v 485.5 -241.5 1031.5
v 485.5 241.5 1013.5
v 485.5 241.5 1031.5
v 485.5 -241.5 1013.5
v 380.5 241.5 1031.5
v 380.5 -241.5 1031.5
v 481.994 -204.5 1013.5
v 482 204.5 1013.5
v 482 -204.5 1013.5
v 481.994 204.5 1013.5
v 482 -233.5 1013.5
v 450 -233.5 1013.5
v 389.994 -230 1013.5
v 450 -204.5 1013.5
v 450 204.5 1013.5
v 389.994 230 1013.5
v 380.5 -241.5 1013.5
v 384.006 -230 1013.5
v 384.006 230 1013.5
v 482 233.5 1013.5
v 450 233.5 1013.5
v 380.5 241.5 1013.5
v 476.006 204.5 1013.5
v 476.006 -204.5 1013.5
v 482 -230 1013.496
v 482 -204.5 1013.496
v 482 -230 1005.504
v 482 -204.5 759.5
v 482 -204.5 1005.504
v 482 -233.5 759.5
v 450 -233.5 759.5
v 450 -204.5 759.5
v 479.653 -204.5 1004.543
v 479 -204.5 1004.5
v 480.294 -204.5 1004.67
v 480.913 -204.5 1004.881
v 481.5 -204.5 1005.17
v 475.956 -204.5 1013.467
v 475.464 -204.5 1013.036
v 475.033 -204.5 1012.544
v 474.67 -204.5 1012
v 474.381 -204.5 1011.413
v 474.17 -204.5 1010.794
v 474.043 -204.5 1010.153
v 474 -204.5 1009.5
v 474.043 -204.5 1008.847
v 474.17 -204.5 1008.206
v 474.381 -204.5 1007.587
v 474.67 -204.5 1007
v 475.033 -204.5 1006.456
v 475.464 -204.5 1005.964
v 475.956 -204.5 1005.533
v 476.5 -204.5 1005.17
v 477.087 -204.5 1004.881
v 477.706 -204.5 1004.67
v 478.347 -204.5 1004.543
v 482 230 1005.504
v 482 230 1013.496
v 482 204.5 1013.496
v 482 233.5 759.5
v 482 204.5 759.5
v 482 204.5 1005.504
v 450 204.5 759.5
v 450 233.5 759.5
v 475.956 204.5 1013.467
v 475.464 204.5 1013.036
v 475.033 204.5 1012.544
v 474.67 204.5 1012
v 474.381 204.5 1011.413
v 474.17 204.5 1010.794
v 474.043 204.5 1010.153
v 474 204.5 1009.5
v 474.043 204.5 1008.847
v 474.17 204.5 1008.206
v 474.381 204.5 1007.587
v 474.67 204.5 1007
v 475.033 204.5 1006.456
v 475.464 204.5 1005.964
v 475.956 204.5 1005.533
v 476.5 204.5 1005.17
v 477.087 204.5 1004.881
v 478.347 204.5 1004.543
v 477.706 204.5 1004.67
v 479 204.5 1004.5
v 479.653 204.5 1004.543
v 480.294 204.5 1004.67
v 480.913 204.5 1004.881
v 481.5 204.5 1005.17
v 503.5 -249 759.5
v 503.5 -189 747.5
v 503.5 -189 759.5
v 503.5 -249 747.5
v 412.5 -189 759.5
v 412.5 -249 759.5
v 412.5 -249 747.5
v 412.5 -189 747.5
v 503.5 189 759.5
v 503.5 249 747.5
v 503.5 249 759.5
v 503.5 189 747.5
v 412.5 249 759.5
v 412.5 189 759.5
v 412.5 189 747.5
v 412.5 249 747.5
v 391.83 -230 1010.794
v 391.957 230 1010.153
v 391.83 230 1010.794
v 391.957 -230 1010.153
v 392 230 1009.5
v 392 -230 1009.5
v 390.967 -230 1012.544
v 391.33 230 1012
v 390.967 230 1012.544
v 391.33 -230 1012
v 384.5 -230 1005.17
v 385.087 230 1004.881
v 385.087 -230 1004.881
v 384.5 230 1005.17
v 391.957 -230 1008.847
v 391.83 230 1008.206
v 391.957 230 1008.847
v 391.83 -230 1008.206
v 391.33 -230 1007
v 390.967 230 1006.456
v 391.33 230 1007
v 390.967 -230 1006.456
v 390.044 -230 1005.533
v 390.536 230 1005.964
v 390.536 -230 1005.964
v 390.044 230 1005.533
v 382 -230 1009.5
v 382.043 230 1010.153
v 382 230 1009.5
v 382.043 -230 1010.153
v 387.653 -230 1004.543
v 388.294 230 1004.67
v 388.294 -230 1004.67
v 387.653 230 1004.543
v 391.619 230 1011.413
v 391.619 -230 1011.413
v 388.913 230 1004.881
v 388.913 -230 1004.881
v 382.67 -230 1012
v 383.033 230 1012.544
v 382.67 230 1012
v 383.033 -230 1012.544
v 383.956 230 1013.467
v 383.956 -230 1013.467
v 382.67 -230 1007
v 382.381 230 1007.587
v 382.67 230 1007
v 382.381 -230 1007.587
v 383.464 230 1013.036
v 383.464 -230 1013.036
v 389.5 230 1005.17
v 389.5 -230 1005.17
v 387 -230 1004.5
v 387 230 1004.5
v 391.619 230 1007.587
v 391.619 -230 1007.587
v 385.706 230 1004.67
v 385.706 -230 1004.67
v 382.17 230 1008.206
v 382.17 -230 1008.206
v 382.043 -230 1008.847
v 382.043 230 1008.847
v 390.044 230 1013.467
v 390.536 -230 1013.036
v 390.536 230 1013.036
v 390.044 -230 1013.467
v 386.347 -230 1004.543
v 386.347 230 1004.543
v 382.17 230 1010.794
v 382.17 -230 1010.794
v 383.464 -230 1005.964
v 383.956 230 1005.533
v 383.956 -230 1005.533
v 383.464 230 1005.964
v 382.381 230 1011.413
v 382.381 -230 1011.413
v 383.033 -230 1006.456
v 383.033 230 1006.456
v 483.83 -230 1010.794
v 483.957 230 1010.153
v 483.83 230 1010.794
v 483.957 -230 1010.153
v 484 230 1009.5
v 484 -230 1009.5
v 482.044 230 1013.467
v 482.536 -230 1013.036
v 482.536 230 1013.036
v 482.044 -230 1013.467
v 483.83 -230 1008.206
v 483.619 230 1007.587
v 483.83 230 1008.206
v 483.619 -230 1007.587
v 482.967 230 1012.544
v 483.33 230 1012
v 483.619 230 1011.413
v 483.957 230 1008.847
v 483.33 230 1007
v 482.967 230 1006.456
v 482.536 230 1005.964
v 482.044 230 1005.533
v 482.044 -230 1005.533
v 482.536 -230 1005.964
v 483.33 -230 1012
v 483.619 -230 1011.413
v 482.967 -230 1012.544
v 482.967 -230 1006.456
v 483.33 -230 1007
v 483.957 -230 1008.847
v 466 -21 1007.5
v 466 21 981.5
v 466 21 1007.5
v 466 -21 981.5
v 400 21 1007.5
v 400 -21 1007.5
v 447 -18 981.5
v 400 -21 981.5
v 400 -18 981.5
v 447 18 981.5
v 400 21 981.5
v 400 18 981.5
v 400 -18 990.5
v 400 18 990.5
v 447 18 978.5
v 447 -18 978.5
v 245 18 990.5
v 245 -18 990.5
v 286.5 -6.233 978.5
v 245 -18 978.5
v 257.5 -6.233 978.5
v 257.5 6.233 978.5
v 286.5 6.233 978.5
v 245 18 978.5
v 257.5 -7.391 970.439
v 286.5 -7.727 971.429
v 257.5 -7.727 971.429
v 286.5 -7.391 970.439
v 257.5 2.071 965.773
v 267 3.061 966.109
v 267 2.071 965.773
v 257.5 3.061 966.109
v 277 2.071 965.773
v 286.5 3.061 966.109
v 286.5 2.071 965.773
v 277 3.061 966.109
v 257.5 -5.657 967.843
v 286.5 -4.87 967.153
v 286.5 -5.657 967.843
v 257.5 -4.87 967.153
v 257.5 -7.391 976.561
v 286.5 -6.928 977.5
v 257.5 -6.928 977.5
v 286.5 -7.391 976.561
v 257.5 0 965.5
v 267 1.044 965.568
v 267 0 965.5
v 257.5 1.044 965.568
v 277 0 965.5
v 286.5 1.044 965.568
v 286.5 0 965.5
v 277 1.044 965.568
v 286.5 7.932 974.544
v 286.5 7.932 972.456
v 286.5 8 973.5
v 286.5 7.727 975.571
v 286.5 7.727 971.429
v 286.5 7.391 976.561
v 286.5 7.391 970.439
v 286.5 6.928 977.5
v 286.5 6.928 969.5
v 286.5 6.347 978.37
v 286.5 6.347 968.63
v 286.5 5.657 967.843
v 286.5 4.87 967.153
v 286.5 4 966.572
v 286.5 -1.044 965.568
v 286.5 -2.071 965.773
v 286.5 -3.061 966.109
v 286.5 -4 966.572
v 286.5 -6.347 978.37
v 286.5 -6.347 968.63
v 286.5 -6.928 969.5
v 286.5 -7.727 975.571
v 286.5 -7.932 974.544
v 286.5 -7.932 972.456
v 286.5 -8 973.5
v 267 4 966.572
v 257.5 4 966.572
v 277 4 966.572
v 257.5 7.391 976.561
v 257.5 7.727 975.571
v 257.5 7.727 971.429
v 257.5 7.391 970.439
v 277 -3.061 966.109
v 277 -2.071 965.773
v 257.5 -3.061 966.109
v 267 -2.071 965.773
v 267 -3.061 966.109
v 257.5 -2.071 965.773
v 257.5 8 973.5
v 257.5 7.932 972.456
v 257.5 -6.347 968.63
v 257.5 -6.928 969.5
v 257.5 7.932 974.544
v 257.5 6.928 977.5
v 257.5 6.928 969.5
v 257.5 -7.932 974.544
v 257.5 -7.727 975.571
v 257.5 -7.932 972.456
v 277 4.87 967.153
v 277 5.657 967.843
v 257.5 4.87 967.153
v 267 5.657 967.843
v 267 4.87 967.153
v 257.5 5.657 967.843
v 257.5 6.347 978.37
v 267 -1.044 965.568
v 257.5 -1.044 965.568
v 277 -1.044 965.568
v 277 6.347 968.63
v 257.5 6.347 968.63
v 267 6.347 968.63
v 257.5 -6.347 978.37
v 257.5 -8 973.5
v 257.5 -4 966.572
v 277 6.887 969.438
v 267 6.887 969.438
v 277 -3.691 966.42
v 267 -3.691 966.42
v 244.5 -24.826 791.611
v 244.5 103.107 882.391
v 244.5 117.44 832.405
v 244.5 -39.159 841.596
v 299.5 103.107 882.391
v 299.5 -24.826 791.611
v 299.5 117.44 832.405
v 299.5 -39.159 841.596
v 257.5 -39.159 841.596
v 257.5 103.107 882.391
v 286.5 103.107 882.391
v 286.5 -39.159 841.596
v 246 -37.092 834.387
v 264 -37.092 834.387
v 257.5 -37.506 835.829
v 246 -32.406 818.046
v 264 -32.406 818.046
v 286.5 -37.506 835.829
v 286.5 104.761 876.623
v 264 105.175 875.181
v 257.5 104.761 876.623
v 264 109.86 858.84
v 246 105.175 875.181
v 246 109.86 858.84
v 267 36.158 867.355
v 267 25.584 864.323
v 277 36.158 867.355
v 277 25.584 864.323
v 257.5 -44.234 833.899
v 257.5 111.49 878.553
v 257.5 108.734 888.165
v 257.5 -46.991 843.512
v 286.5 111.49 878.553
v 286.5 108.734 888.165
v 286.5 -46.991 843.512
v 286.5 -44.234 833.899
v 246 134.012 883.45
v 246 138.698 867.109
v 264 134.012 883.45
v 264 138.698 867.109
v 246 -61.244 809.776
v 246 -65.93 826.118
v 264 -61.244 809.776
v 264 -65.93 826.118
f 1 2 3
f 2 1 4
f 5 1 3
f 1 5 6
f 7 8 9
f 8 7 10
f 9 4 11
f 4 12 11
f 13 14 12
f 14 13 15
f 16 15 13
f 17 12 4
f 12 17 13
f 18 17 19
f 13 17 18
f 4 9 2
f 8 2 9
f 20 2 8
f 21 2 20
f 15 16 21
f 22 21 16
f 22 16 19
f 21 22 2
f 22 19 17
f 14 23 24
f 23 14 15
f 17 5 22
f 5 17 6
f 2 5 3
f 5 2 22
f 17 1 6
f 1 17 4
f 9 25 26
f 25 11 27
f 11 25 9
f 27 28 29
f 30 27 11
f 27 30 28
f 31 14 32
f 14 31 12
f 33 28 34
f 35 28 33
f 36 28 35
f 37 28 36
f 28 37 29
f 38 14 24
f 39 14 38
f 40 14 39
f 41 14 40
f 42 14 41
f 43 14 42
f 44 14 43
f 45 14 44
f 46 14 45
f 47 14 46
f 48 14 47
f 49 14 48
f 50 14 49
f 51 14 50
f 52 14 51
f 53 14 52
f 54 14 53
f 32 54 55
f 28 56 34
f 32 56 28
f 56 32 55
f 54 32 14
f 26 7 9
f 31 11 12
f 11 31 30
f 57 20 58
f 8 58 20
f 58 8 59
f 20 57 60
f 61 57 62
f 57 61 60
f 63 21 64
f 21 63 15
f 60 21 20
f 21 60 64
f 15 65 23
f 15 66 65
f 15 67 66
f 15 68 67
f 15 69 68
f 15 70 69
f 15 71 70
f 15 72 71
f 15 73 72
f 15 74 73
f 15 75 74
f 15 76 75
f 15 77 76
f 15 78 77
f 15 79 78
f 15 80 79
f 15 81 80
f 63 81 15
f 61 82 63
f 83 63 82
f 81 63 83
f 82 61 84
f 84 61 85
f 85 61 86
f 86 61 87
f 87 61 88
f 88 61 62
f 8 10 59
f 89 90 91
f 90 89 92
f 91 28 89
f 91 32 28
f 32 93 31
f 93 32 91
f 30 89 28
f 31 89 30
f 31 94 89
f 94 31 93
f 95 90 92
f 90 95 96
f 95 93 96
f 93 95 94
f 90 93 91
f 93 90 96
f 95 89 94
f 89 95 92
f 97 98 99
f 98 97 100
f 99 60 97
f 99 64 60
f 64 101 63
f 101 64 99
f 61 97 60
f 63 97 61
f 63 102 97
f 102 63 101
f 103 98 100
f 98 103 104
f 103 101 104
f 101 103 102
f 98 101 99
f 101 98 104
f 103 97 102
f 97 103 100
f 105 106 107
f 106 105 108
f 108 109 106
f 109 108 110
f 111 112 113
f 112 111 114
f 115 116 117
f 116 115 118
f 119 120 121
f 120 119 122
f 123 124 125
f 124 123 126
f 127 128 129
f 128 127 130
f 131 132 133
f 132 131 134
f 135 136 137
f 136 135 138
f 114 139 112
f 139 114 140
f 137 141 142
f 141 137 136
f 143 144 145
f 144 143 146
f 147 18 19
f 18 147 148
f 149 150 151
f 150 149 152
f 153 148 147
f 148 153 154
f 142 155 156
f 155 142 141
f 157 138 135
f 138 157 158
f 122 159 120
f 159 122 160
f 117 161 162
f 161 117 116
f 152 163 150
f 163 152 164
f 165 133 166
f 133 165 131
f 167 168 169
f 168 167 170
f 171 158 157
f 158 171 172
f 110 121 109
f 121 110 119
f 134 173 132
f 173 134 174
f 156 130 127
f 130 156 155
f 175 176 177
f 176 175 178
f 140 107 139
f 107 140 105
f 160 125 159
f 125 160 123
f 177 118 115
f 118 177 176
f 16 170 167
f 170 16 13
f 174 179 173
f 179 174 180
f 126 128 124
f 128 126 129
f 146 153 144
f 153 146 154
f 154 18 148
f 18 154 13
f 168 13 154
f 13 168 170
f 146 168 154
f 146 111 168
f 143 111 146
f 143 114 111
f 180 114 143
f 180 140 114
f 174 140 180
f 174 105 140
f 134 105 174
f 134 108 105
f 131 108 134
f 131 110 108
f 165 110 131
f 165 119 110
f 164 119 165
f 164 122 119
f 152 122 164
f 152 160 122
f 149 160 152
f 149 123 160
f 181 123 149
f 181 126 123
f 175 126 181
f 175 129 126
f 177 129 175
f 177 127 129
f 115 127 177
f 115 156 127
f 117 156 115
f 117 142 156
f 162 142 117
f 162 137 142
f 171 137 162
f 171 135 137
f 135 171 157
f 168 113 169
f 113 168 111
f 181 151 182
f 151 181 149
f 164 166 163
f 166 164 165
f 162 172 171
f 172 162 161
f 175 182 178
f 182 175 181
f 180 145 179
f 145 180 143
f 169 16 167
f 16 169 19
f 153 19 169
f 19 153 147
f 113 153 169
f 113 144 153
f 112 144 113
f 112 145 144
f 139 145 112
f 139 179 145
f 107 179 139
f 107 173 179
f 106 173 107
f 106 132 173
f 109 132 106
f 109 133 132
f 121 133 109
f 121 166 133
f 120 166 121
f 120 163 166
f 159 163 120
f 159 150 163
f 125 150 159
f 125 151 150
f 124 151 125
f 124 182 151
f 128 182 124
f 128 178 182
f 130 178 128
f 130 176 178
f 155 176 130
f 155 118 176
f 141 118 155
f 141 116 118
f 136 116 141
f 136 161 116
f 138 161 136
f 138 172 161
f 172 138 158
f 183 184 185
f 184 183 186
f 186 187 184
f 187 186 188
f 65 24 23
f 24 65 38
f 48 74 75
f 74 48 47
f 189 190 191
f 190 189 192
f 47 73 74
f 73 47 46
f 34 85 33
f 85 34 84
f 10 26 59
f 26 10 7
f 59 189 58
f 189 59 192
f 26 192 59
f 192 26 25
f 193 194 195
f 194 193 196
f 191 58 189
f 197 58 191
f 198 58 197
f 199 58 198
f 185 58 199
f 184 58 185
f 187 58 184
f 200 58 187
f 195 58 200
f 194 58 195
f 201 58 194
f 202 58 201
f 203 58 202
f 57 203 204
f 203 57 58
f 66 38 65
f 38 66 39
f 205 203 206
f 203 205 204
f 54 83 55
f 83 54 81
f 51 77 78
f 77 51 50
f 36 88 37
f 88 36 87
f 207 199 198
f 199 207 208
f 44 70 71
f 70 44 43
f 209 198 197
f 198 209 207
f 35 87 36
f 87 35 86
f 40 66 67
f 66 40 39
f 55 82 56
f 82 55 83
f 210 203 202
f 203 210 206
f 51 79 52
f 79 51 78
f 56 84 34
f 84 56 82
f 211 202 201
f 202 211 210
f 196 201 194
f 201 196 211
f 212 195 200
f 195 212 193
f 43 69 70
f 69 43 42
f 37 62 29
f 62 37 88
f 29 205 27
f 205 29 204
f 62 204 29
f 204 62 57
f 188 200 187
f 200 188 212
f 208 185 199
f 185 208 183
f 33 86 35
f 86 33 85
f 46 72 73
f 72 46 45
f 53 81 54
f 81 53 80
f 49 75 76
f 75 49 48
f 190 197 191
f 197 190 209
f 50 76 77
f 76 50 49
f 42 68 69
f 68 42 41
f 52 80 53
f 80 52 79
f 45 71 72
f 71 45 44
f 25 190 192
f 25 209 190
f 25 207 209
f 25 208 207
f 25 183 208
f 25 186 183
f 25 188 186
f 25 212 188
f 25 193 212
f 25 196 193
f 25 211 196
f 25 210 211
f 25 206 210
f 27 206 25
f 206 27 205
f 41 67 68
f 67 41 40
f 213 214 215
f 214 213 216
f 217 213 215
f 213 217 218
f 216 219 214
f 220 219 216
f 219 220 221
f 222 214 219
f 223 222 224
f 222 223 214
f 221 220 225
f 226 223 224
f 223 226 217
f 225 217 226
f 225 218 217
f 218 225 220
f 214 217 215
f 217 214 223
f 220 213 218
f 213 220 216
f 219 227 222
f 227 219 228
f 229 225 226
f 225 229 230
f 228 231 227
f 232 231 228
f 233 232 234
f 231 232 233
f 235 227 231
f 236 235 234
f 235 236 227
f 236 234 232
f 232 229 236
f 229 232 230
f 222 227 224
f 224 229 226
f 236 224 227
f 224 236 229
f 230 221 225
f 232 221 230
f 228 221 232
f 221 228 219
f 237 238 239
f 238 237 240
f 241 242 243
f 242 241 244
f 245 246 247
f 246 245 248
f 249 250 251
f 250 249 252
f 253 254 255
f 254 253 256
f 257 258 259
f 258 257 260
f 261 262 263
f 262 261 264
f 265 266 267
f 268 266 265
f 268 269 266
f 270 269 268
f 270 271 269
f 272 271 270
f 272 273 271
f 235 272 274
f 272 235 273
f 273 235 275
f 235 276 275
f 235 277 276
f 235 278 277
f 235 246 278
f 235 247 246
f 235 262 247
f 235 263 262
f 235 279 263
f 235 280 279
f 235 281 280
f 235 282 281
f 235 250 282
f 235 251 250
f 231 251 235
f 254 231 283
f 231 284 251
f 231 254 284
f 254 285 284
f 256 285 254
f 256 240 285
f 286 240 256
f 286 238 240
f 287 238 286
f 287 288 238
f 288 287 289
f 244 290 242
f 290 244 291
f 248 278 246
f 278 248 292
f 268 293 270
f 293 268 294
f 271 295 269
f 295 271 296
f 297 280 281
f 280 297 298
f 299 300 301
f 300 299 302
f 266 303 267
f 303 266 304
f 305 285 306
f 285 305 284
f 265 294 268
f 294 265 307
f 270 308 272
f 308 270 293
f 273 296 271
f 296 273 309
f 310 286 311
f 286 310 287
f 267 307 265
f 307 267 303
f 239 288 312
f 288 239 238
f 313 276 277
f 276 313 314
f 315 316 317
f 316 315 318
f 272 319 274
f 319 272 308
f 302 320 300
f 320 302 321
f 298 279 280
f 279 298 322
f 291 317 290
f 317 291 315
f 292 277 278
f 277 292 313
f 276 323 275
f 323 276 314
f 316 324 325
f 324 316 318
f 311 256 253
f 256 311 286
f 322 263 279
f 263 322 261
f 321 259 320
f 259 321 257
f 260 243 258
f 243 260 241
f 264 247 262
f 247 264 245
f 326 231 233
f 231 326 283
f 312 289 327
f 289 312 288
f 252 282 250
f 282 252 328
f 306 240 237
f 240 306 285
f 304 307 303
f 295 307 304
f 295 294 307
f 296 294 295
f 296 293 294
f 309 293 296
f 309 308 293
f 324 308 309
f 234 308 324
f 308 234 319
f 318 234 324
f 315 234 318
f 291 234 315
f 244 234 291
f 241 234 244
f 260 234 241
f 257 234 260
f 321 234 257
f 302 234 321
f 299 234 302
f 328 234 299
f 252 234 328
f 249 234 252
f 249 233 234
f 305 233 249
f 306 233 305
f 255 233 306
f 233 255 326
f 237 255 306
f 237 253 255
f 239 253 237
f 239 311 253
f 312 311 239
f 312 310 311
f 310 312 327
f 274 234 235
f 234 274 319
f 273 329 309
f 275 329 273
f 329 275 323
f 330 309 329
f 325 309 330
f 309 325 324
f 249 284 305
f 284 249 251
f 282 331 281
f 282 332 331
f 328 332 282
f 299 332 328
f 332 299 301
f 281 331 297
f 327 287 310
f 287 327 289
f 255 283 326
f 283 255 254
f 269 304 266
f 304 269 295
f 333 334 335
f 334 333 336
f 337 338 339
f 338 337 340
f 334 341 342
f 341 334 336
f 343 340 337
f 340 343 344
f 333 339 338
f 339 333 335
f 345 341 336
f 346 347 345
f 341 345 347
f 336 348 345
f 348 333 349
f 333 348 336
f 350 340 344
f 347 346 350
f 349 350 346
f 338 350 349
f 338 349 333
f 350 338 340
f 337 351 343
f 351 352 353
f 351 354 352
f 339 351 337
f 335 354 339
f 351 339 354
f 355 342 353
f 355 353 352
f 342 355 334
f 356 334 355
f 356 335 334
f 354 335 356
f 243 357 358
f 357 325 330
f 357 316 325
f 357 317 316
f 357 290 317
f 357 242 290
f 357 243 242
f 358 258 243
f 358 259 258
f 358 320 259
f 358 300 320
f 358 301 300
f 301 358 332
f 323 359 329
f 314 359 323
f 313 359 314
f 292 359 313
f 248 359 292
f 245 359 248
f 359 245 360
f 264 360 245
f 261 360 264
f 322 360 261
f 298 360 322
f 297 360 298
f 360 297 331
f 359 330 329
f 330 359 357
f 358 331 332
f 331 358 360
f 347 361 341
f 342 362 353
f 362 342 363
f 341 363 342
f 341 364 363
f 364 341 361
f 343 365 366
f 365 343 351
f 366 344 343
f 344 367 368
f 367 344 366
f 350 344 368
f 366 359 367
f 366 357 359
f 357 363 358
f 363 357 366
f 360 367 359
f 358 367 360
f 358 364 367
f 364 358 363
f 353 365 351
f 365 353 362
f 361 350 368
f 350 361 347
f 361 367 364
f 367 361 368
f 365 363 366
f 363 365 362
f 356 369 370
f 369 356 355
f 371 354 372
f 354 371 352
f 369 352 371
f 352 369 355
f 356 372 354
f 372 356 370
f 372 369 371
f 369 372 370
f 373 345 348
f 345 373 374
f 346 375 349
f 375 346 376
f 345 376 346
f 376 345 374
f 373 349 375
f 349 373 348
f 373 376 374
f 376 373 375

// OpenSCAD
// Millimetre geometric reference; use real functional tools, not printed heated or cutting equipment.
// Source SHA-256: ab407ee35668ee6f7083258a5336b76c34a7b636b36c661e7134b7ea4c32d786
$fn=48;
module gantry_rail(){
translate([0, 0, 0]) rotate([0, 0, 0]) cube([105, 483, 18],center=true);
translate([33, -219, -134]) rotate([0, 0, 0]) cube([32, 29, 266],center=true);
translate([33, 219, -134]) rotate([0, 0, 0]) cube([32, 29, 266],center=true);
translate([25, -219, -269]) rotate([0, 0, 0]) cube([91, 60, 12],center=true);
translate([25, 219, -269]) rotate([0, 0, 0]) cube([91, 60, 12],center=true);
translate([-46, 0, -13]) rotate([0, 0, 0]) rotate([90,0,0]) cylinder(r=5,h=460,center=true);
translate([46, 0, -13]) rotate([0, 0, 0]) rotate([90,0,0]) cylinder(r=5,h=460,center=true);
}
module beam_trolley(){
translate([0, 0, 0]) rotate([0, 0, 0]) cube([66, 42, 26],center=true);
translate([-87, 0, -10]) rotate([0, 0, 0]) cube([202, 36, 12],center=true);
translate([-161, 0, -21]) rotate([0, 0, 0]) rotate([0,90,0]) cylinder(r=8,h=29,center=true);
}
module suspended_fixture(){
translate([0, 0, 0]) rotate([16, 0, 0]) cube([55, 148, 52],center=true);
translate([0, -21.4997137537, 74.9784122832]) rotate([16, 0, 0]) cube([10, 11, 122],center=true);
translate([0, -6.89093389542, 24.0315423985]) rotate([16, 0, 0]) cube([29, 162, 10],center=true);
translate([-17, 79.9121322925, 33.3174295596]) rotate([16, 0, 0]) cube([18, 36, 17],center=true);
translate([-17, -85.4248794089, -14.0921956409]) rotate([16, 0, 0]) cube([18, 36, 17],center=true);
}
translate([433, 0, 1022.5]) rotate([0,0,0]) gantry_rail();
translate([433, 0, 994.5]) rotate([0,0,0]) beam_trolley();
translate([272, 39.140504526, 837.000839177]) rotate([0,0,0]) suspended_fixture();
